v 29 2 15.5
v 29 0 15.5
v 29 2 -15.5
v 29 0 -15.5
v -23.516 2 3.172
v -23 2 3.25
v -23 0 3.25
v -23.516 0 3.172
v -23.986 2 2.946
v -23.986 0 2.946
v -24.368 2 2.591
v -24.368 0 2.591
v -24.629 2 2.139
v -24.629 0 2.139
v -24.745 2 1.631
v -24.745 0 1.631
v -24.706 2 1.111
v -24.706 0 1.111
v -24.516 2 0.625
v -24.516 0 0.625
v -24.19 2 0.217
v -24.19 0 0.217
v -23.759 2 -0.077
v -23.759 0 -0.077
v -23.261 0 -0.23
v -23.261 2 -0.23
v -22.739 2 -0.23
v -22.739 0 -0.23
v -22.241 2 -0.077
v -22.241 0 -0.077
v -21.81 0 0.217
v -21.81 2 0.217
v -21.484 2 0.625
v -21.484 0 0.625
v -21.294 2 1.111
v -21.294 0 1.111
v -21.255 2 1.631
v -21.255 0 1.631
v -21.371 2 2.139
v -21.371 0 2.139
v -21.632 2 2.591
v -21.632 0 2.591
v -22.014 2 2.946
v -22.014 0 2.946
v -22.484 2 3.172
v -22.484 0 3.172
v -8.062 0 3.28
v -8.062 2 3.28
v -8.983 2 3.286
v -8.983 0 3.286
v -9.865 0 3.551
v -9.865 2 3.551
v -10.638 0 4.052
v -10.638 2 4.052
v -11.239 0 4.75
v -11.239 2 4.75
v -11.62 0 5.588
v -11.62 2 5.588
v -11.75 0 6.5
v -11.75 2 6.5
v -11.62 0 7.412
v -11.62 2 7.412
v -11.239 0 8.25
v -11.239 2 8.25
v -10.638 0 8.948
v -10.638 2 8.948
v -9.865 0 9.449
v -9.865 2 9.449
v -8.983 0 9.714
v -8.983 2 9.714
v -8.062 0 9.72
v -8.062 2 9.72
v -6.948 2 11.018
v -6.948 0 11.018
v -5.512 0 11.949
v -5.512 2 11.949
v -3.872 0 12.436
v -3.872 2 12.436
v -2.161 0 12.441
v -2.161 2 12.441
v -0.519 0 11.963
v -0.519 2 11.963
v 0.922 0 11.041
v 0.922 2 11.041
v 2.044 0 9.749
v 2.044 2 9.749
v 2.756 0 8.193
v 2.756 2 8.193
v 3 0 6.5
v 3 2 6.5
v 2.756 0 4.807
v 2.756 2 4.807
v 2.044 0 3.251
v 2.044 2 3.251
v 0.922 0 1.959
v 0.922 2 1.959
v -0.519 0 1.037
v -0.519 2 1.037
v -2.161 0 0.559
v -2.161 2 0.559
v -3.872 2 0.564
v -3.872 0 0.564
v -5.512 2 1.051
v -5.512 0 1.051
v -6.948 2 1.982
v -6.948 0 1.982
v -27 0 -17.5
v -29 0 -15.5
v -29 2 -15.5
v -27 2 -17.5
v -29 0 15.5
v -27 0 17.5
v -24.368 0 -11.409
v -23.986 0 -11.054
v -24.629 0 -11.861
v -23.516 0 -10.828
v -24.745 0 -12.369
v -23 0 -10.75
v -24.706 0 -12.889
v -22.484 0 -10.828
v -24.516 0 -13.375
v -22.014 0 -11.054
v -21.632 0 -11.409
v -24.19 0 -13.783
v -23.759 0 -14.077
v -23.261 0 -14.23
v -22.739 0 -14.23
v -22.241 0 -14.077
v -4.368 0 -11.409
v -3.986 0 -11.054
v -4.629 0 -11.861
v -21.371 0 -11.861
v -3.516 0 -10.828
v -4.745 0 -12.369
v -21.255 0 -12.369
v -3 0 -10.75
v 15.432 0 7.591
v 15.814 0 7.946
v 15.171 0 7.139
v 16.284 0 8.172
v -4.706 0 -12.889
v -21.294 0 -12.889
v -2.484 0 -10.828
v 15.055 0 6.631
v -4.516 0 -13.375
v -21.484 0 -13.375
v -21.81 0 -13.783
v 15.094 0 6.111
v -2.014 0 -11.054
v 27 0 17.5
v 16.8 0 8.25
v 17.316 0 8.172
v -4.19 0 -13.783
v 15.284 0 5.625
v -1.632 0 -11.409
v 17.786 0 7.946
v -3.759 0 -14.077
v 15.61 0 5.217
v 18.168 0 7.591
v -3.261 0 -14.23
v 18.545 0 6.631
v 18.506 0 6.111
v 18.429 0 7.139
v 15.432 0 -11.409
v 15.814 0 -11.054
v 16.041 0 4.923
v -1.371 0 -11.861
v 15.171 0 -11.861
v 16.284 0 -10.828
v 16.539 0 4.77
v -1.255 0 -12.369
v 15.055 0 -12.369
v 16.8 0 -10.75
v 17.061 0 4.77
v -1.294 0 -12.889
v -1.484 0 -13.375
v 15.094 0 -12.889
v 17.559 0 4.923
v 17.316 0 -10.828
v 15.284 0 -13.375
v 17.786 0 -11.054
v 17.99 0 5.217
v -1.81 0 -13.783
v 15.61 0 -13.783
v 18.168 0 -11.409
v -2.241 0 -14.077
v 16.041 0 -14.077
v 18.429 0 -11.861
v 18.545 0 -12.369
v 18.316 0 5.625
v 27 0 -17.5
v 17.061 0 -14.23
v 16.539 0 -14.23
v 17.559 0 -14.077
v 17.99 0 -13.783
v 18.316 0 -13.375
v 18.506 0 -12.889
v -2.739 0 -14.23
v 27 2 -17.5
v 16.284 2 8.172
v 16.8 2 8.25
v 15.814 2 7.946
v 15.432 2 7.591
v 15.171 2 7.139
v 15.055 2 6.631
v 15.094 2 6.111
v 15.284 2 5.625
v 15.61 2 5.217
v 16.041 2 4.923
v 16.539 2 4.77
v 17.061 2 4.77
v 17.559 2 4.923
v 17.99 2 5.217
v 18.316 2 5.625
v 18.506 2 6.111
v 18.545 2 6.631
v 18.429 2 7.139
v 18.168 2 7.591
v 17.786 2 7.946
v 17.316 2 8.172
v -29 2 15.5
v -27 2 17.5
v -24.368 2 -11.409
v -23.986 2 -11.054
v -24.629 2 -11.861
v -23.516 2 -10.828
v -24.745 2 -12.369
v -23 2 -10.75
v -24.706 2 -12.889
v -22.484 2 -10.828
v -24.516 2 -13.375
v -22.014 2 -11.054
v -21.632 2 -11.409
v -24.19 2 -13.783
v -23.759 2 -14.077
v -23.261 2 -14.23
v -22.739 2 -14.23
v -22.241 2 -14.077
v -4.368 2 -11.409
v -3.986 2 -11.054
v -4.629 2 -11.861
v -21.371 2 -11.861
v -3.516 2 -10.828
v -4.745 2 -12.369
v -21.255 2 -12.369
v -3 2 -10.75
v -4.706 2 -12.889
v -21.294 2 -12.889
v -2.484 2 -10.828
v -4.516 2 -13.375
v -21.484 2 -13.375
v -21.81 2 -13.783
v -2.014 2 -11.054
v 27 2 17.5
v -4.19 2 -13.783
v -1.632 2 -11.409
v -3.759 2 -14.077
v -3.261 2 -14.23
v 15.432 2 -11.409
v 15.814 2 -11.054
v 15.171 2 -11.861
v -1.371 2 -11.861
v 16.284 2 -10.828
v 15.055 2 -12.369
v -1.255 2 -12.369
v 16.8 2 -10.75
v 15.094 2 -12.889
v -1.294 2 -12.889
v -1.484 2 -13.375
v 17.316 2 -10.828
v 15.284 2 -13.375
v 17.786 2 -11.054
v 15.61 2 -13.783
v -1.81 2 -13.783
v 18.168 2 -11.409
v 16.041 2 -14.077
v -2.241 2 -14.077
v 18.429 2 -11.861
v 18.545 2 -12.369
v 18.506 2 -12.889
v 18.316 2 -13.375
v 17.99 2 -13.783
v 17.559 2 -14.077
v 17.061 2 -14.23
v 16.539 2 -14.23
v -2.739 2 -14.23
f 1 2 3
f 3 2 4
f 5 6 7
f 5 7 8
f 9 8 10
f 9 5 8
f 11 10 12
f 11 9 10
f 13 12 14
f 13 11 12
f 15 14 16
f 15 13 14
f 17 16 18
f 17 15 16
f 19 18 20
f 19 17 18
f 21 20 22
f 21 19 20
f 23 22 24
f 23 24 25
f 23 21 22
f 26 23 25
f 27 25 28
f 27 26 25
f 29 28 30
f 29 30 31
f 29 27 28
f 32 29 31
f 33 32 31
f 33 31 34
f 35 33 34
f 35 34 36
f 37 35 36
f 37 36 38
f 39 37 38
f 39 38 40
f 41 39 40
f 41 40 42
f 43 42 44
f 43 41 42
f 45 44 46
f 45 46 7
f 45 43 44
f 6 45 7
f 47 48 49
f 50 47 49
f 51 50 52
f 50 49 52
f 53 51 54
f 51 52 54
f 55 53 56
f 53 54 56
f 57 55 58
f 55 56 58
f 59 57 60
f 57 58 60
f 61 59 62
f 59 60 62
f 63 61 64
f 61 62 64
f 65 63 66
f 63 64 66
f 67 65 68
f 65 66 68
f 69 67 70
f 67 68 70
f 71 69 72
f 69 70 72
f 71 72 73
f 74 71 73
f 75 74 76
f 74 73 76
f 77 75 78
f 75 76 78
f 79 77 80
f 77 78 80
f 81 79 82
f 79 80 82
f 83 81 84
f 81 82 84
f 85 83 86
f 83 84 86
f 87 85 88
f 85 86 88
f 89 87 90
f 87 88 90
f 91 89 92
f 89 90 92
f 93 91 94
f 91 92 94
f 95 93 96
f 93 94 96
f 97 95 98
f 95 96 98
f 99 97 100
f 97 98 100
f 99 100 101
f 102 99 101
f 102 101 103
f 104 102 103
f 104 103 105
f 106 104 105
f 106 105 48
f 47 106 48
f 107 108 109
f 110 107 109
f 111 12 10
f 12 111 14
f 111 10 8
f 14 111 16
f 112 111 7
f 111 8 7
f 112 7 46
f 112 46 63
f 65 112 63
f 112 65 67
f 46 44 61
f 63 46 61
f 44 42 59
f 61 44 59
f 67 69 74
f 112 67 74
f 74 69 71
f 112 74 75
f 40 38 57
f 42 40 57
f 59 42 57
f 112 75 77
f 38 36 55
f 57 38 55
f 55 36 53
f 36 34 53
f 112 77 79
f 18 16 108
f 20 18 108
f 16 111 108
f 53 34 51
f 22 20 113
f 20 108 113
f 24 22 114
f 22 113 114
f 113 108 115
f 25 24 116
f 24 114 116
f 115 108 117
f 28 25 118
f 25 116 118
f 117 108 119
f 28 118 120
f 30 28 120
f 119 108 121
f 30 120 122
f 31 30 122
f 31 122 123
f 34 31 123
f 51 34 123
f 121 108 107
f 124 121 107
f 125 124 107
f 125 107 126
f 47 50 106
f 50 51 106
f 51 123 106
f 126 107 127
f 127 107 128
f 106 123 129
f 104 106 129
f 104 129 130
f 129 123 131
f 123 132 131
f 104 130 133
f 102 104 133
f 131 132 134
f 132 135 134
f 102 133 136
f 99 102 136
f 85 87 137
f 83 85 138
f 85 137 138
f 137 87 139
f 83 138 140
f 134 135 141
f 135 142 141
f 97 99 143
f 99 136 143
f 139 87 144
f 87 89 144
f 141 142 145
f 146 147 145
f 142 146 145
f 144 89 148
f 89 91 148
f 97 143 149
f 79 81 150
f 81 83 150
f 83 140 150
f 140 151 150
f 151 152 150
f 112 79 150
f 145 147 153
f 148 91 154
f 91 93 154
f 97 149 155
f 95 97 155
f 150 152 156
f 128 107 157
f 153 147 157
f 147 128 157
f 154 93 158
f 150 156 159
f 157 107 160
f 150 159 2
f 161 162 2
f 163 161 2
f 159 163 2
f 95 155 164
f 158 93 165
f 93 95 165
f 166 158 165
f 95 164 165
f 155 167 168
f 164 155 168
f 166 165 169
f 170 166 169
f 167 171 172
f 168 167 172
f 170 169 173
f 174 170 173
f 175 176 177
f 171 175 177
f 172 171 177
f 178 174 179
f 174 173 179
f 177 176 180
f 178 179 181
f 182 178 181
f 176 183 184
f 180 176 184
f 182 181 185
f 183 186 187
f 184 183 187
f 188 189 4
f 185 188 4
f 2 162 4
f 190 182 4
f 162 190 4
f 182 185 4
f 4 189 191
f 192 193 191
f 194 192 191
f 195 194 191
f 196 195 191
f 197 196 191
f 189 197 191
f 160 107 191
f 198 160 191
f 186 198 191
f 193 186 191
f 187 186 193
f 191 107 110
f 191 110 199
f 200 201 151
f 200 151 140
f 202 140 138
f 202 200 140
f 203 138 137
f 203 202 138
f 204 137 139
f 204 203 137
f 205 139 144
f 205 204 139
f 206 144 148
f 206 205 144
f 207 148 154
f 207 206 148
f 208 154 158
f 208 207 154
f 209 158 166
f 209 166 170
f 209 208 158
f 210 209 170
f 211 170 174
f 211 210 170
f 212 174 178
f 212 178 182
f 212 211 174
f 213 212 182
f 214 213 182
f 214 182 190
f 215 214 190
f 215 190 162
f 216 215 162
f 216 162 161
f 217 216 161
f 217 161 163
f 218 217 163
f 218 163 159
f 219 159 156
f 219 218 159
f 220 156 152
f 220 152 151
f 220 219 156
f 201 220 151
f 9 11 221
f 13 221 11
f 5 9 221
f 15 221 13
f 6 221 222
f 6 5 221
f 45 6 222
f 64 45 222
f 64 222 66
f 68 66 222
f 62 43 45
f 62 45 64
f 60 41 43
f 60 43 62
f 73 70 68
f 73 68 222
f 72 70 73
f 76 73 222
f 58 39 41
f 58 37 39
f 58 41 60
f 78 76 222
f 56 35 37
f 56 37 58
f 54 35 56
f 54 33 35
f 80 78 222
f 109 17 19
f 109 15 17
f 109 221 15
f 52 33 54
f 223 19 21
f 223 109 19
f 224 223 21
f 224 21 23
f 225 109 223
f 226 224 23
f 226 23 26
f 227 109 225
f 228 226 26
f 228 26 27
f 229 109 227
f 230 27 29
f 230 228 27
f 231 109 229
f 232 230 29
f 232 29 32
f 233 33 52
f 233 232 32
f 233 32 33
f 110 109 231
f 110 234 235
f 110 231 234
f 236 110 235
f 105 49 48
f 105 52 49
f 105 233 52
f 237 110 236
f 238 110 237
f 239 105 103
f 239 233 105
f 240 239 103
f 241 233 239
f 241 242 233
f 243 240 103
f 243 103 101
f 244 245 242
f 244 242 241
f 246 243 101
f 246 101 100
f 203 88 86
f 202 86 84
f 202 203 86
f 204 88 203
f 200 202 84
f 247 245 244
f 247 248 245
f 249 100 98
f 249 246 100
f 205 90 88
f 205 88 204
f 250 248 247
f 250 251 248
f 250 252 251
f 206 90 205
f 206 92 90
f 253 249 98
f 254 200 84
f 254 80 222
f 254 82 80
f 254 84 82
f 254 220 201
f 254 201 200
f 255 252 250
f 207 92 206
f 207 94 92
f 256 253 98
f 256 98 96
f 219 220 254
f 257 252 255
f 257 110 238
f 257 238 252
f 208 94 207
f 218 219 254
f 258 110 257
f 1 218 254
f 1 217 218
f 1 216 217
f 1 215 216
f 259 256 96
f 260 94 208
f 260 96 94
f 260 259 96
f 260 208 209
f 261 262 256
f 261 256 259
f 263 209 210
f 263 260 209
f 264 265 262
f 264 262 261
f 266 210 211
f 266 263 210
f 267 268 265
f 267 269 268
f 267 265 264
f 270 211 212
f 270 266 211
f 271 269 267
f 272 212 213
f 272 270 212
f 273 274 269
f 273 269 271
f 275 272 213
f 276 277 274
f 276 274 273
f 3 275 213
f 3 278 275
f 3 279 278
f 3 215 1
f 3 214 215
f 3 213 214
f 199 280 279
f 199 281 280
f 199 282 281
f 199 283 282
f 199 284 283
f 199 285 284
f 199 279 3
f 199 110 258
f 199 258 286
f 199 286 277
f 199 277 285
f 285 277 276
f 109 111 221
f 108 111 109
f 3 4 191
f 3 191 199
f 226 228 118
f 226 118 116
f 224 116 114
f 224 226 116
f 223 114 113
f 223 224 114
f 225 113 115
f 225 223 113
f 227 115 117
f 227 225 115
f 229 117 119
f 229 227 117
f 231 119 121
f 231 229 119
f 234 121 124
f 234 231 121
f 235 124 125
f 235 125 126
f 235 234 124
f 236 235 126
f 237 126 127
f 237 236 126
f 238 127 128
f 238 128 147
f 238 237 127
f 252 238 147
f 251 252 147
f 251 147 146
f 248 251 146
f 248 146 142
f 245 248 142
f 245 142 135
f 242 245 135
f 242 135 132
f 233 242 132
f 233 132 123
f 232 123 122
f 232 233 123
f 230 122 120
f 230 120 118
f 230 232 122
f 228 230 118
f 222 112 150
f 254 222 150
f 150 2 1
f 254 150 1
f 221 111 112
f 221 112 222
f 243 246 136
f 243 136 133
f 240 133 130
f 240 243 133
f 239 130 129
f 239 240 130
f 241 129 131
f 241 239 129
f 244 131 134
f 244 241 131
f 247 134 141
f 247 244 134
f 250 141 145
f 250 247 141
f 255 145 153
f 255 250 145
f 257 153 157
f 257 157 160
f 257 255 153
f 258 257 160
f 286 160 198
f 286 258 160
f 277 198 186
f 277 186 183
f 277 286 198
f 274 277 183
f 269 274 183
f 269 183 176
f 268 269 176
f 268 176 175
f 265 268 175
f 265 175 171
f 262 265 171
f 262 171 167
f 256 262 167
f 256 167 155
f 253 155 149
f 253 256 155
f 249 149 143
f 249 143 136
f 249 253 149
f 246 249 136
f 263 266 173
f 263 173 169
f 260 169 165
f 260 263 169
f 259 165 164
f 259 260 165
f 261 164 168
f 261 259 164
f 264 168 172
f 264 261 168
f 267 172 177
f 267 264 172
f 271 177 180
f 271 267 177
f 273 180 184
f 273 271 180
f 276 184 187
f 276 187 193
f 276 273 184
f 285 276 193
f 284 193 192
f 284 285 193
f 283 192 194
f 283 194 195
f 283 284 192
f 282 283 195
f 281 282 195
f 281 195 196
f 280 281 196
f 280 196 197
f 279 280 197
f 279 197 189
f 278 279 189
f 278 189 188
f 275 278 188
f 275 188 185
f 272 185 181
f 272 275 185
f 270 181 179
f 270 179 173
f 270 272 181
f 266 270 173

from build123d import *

# Parameters (mm, degrees)
SKETCH1_W                      = 58
SKETCH1_H                      = 35
BOSS_EXTRUDE1_DEPTH            = 2
M3X0_5_TAPPED_HOLE1_AT_2_COUNT = 2
M3X0_5_TAPPED_HOLE1_AT_2_PITCH = 20
M3X0_5_TAPPED_HOLE1_AT_3_COUNT = 2
M3X0_5_TAPPED_HOLE1_AT_3_PITCH = 39.8
M3X0_5_TAPPED_HOLE1_AT_4_COUNT = 2
M3X0_5_TAPPED_HOLE1_AT_4_PITCH = 44.102607633
M3X0_5_TAPPED_HOLE1_AT_5_COUNT = 2
M3X0_5_TAPPED_HOLE1_AT_5_PITCH = 14
CUT_EXTRUDE1_DEPTH             = 34.930075155
CHAMFER1_SIZE                  = 2


with BuildPart() as part:
    # Sketch1 → Boss-Extrude1 (new body)
    with BuildSketch(Plane(origin=(0, 0, 0), x_dir=(1, 0, 0), z_dir=(0, 1, 0))):
        Rectangle(SKETCH1_W, SKETCH1_H)
    extrude(amount=BOSS_EXTRUDE1_DEPTH)

    # Sketch3 → M3x0.5 Tapped Hole1 (revolve, cut)
    with BuildSketch(Plane(origin=(-23, 2, -12.5), x_dir=(0, 0, 1), z_dir=(1, 0, 0))):
        Polygon((0, 0), (0, 2), (1.75, 2), (1.75, -0.225), (1.525, 0), align=None)
    m3x0_5_tapped_hole1 = revolve(axis=Axis((-23, 8.35, -12.5), (0, -1, 0)), mode=Mode.SUBTRACT)

    # M3x0.5 Tapped Hole1 at 2: M3x0.5 Tapped Hole1 ×2
    with Locations(*[(i * M3X0_5_TAPPED_HOLE1_AT_2_PITCH, 0, 0) for i in range(1, M3X0_5_TAPPED_HOLE1_AT_2_COUNT)]):
        add(m3x0_5_tapped_hole1, mode=Mode.SUBTRACT)

    # M3x0.5 Tapped Hole1 at 3: M3x0.5 Tapped Hole1 ×2
    with Locations(*[(i * M3X0_5_TAPPED_HOLE1_AT_3_PITCH, 0, 0) for i in range(1, M3X0_5_TAPPED_HOLE1_AT_3_COUNT)]):
        add(m3x0_5_tapped_hole1, mode=Mode.SUBTRACT)

    # M3x0.5 Tapped Hole1 at 4: M3x0.5 Tapped Hole1 ×2
    with Locations(*[Vector(0.9024409697382602, 0, 0.4308135282670086) * (i * M3X0_5_TAPPED_HOLE1_AT_4_PITCH) for i in range(1, M3X0_5_TAPPED_HOLE1_AT_4_COUNT)]):
        add(m3x0_5_tapped_hole1, mode=Mode.SUBTRACT)

    # M3x0.5 Tapped Hole1 at 5: M3x0.5 Tapped Hole1 ×2
    with Locations(*[(0, 0, i * M3X0_5_TAPPED_HOLE1_AT_5_PITCH) for i in range(1, M3X0_5_TAPPED_HOLE1_AT_5_COUNT)]):
        add(m3x0_5_tapped_hole1, mode=Mode.SUBTRACT)

    # Sketch4 → Cut-Extrude1 (cut, through all)
    with BuildSketch(Plane(origin=(0, 2, 0), x_dir=(1, 0, 0), z_dir=(0, 1, 0))):
        with BuildLine():
            ThreePointArc((-8.0625, -3.279581743), (-11.75, -6.5), (-8.0625, -9.720418257))
            ThreePointArc((-8.0625, -9.720418257), (3, -6.5), (-8.0625, -3.279581743))
        make_face()
    extrude(amount=-CUT_EXTRUDE1_DEPTH, mode=Mode.SUBTRACT)

    # Chamfer1
    chamfer1_edges = [part.edges().sort_by_distance(p)[0] for p in [
        (29, 1, 17.5),
        (-29, 1, 17.5),
        (-29, 1, -17.5),
        (29, 1, -17.5),
    ]]
    chamfer(chamfer1_edges, length=CHAMFER1_SIZE)


solid = part.part
